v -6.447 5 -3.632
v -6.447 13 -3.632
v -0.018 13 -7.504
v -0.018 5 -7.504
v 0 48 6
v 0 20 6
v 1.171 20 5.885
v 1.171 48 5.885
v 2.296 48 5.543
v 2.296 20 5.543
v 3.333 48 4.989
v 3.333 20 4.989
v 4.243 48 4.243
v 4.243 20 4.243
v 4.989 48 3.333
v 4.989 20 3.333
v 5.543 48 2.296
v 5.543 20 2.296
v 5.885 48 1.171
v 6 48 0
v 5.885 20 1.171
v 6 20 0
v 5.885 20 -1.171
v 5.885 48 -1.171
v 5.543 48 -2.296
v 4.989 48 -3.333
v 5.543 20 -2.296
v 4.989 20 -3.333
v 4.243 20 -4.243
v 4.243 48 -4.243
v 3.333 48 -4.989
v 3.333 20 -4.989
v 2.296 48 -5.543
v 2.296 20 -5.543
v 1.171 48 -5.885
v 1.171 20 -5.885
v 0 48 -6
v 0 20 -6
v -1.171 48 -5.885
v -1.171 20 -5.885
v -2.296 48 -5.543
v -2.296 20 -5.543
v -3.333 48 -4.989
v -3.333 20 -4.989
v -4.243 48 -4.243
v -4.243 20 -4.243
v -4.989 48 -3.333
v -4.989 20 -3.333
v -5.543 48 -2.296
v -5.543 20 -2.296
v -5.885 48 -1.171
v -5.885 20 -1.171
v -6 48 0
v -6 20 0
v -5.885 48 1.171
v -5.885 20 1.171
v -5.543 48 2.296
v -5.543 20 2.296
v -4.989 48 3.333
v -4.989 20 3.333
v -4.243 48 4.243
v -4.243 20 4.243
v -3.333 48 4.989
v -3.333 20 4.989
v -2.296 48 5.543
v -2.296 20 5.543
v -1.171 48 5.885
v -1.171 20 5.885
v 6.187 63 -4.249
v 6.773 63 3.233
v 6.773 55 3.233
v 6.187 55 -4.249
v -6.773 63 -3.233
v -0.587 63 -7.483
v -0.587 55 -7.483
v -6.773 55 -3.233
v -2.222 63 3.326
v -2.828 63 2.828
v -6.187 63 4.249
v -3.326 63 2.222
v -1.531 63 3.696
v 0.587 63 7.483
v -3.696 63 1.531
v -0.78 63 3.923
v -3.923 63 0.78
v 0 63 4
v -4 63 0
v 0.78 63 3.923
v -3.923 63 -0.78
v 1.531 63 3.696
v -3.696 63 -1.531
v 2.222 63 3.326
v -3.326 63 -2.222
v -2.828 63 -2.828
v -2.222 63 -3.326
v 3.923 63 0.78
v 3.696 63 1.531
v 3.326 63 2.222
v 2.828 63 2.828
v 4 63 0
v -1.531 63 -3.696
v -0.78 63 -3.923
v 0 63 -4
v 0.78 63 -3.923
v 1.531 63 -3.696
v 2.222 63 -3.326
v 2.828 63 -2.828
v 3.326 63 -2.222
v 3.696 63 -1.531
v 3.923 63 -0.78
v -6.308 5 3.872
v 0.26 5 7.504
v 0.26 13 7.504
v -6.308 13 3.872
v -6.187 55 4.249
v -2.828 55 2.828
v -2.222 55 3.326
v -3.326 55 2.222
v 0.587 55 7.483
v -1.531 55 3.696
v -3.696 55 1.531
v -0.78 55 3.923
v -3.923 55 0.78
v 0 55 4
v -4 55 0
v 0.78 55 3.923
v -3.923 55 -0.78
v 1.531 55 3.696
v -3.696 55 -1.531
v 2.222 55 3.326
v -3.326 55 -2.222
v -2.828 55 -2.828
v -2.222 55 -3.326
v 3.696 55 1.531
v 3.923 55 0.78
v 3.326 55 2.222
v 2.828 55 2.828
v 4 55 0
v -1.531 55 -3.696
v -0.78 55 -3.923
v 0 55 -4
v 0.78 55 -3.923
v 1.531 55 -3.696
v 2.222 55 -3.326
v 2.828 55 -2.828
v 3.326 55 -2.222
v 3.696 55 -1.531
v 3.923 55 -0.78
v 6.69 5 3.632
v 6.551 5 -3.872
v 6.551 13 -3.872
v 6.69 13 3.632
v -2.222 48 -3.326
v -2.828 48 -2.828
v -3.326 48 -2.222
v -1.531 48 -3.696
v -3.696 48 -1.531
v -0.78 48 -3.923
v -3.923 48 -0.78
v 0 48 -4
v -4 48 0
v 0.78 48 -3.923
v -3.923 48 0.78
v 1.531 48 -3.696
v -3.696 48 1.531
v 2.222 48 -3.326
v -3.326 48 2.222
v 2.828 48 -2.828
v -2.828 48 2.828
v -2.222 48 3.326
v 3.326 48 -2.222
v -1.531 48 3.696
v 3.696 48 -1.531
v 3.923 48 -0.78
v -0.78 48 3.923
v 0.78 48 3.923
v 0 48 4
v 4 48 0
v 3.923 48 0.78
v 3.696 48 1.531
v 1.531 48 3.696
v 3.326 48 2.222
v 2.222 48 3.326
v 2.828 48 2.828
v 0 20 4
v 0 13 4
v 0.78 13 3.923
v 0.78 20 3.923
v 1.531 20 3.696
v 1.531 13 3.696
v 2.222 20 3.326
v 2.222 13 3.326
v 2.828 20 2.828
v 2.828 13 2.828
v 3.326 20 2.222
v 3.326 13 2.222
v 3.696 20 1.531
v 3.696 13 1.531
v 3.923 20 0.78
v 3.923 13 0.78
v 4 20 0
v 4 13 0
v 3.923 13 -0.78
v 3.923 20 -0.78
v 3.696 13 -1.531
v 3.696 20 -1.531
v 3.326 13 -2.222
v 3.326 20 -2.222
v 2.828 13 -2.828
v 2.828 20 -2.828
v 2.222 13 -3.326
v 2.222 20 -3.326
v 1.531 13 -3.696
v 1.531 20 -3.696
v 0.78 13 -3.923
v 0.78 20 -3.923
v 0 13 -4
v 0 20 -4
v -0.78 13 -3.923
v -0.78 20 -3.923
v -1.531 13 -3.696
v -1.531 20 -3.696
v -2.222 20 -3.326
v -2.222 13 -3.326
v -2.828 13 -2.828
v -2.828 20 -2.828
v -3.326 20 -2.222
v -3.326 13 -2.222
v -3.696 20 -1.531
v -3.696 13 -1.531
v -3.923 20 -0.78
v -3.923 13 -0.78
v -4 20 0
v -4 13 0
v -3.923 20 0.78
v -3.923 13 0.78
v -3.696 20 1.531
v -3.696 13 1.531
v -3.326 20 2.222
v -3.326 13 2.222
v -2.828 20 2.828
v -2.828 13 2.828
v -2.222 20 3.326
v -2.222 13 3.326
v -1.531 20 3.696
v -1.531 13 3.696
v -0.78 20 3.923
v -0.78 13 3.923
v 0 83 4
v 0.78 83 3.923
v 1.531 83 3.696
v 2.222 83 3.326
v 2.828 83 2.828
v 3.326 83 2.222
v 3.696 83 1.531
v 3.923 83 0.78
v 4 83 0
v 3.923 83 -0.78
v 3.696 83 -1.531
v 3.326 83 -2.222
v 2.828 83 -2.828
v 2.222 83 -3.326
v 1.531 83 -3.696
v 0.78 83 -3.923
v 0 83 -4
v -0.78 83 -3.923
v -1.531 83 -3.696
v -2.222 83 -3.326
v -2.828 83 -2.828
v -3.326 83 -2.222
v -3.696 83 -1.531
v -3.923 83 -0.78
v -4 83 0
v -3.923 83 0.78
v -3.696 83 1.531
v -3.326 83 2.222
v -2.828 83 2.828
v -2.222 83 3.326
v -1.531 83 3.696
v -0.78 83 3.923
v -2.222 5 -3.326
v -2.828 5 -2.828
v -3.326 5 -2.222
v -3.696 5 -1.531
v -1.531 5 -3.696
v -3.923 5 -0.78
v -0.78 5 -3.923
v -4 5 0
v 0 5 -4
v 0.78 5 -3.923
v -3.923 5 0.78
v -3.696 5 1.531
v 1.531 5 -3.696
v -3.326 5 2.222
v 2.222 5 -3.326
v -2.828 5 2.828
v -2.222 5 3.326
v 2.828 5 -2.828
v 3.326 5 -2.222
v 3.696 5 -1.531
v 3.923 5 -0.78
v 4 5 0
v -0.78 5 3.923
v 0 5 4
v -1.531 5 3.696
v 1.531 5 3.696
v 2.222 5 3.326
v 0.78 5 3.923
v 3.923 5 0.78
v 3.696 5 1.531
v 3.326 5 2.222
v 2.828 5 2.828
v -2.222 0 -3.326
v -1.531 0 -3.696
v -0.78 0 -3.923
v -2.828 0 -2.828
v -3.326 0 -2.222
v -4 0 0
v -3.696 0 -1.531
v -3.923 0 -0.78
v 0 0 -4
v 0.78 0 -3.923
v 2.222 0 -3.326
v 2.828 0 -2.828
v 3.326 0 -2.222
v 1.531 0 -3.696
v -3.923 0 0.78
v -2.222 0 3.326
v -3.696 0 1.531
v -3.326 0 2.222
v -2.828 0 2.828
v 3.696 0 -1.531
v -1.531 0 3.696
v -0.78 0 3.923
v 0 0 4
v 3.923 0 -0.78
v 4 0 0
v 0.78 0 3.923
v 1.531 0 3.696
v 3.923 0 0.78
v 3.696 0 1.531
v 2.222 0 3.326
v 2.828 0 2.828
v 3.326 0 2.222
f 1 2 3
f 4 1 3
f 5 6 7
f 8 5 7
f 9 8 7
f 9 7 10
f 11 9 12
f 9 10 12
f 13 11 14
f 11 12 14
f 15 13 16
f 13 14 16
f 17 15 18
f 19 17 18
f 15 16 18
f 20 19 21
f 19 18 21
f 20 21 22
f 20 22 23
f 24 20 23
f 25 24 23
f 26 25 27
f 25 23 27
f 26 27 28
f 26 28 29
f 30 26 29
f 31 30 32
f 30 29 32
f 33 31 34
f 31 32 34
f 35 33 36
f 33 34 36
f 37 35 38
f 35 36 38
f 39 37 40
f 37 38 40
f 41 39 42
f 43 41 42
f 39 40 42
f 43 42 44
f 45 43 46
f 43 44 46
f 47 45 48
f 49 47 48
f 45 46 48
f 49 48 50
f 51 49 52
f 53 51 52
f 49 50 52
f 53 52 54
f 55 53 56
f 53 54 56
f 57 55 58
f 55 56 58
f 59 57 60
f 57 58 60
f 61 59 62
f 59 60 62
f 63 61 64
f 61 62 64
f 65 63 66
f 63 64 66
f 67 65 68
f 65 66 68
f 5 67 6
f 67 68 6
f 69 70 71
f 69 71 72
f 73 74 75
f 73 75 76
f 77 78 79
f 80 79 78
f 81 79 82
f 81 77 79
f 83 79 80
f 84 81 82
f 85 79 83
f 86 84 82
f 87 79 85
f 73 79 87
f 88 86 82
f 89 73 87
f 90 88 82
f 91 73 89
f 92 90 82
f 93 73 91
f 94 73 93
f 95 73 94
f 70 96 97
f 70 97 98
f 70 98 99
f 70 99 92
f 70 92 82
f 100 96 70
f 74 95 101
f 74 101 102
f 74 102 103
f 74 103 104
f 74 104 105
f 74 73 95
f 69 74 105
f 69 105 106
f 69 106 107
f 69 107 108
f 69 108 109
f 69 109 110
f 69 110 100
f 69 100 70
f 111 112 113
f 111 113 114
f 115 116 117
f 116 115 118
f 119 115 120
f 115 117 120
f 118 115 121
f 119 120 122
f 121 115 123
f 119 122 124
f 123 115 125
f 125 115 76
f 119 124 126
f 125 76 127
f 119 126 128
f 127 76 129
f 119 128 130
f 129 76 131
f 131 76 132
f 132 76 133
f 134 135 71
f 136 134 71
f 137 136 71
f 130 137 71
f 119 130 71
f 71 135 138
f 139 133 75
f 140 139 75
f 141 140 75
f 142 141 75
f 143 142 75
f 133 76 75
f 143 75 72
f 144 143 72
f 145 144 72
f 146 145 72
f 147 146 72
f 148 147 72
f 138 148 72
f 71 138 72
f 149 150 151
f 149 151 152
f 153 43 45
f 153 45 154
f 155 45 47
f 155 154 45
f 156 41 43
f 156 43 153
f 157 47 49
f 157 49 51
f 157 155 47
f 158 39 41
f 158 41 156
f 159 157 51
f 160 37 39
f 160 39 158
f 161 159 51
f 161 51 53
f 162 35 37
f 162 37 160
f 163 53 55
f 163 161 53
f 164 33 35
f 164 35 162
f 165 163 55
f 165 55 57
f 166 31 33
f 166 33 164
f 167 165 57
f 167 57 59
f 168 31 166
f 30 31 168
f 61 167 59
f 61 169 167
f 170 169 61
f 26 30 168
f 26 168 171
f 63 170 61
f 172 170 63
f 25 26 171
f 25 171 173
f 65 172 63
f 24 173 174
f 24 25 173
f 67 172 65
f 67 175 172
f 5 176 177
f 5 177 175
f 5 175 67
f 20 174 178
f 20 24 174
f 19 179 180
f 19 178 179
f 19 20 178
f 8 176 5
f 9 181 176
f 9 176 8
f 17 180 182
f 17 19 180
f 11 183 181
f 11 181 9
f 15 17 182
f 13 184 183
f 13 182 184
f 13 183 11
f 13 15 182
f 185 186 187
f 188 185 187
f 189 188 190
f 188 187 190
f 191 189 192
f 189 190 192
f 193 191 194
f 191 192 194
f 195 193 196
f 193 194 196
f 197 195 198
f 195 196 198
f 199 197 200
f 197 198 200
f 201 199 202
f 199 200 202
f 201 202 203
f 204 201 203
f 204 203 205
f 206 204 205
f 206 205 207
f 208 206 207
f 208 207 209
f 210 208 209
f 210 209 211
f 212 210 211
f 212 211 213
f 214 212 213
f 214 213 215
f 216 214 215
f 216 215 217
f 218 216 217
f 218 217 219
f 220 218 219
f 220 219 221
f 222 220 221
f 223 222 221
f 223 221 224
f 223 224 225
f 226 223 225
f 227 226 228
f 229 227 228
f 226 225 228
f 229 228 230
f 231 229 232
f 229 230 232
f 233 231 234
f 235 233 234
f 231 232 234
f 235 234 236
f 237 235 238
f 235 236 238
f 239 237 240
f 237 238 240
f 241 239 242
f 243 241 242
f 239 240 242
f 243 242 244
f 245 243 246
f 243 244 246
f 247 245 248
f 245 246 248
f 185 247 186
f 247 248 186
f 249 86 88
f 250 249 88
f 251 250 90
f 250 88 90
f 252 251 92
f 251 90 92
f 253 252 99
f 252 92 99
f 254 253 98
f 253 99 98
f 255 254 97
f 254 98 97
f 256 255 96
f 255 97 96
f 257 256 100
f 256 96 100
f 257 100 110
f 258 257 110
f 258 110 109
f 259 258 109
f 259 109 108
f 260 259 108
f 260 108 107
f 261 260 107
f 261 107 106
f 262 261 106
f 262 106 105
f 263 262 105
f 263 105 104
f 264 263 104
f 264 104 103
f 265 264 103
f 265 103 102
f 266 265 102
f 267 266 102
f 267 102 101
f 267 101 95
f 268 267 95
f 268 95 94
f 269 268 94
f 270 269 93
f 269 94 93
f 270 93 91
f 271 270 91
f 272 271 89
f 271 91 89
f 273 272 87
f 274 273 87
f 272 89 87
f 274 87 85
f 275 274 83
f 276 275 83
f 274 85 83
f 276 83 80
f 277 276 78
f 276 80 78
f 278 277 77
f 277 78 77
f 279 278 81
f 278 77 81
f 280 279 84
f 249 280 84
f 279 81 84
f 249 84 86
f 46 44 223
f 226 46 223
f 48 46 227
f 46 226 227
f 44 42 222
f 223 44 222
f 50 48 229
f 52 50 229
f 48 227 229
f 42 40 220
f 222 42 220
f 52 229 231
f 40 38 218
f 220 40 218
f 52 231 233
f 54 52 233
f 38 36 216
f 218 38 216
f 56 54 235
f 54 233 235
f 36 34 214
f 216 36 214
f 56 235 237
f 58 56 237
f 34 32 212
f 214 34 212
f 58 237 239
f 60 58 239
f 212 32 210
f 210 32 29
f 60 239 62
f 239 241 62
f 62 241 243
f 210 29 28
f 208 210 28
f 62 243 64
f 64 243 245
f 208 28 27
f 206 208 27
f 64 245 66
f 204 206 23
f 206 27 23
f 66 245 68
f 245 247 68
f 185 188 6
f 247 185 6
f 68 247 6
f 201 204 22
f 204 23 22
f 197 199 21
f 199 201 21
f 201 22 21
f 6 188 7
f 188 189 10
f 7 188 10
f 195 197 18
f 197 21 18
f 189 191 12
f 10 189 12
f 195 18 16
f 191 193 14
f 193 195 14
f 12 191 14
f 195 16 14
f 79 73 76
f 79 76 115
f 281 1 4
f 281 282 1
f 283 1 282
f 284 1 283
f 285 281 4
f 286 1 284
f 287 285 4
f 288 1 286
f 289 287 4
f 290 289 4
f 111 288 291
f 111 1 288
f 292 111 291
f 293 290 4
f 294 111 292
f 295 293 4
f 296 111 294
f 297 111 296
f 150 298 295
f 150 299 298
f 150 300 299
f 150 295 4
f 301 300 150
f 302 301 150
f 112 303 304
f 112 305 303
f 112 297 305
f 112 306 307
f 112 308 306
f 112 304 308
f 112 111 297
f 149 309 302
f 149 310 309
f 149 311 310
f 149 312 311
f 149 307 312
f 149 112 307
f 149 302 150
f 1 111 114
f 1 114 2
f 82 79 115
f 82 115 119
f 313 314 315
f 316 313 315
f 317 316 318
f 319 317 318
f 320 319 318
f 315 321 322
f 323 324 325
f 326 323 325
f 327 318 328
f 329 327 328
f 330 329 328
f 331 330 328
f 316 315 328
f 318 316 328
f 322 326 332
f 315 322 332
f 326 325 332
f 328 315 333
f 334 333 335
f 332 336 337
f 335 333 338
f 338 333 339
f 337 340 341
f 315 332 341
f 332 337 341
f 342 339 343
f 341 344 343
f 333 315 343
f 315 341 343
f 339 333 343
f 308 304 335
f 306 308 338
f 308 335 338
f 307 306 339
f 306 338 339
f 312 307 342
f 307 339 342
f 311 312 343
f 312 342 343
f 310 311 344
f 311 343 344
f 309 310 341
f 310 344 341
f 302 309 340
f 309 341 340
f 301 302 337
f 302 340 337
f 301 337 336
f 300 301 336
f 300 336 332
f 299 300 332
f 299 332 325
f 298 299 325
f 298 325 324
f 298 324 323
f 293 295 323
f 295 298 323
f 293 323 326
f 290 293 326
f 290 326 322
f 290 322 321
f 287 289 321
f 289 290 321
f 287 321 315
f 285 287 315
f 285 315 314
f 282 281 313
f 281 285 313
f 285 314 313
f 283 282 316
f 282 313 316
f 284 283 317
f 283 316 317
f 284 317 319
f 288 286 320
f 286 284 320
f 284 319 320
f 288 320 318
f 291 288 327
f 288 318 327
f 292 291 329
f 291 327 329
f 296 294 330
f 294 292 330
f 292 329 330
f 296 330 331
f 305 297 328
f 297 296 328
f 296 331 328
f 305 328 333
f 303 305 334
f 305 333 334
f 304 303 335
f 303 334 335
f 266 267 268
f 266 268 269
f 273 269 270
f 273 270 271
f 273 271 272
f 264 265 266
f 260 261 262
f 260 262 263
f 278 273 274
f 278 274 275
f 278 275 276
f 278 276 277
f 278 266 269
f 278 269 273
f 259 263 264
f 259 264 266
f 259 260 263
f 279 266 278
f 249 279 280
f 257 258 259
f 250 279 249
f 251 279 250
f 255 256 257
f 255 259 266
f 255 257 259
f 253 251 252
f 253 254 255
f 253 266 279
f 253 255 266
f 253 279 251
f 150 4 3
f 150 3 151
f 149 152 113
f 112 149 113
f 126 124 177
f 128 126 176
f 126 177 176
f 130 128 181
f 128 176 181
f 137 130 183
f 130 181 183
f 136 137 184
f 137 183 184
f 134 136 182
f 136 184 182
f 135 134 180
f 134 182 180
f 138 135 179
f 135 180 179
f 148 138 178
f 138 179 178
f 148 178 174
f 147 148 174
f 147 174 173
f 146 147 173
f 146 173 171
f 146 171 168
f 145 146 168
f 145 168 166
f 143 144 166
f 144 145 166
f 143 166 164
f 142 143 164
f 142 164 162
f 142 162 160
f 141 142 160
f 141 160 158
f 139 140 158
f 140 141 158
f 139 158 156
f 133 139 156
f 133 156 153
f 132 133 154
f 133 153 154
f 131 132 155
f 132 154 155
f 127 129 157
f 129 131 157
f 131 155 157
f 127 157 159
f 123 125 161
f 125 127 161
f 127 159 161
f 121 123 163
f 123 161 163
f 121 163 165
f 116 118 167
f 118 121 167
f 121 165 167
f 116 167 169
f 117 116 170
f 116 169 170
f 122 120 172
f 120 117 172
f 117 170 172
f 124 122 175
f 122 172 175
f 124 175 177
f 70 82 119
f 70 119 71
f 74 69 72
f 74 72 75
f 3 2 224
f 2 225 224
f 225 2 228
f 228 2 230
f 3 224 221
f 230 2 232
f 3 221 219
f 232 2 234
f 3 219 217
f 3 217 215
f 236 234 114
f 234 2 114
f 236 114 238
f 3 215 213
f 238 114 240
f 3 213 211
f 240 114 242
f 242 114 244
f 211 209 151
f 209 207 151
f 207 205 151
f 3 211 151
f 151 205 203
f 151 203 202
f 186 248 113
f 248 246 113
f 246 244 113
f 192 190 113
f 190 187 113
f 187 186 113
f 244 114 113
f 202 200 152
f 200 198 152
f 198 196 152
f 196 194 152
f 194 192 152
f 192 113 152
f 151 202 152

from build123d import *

# Parameters (mm, degrees)
IZIM1_R                     = 4
Y_KSEKLIK_EKSTR_ZYON1_DEPTH = 20
IZIM2_R                     = 6
Y_KSEKLIK_EKSTR_ZYON2_DEPTH = 28
IZIM3_R                     = 4
Y_KSEKLIK_EKSTR_ZYON3_DEPTH = 35
Y_KSEKLIK_EKSTR_ZYON4_START = -5
Y_KSEKLIK_EKSTR_ZYON4_DEPTH = 8
Y_KSEKLIK_EKSTR_ZYON5_START = -20
Y_KSEKLIK_EKSTR_ZYON5_DEPTH = 8


with BuildPart() as part:
    # Çizim1 → Yükseklik-Ekstrüzyon1 (new body)
    with BuildSketch(Plane(origin=(0, 0, 0), x_dir=(1, 0, 0), z_dir=(0, 1, 0))):
        with Locations(Location((0, 0, 0), (0, 0, 270))):
            Circle(IZIM1_R)
    extrude(amount=Y_KSEKLIK_EKSTR_ZYON1_DEPTH)

    # Çizim2 → Yükseklik-Ekstrüzyon2 (add)
    with BuildSketch(Plane(origin=(0, 20, 0), x_dir=(1, 0, 0), z_dir=(0, 1, 0))):
        with Locations(Location((0, 0, 0), (0, 0, 270))):
            Circle(IZIM2_R)
    extrude(amount=Y_KSEKLIK_EKSTR_ZYON2_DEPTH)

    # Çizim3 → Yükseklik-Ekstrüzyon3 (add)
    with BuildSketch(Plane(origin=(0, 48, 0), x_dir=(1, 0, 0), z_dir=(0, 1, 0))):
        with Locations(Location((0, 0, 0), (0, 0, 270))):
            Circle(IZIM3_R)
    extrude(amount=Y_KSEKLIK_EKSTR_ZYON3_DEPTH)

    # Çizim4 → Yükseklik-Ekstrüzyon4 (add)
    with BuildSketch(Plane.XZ.offset(Y_KSEKLIK_EKSTR_ZYON4_START)):
        Polygon((-6.308264839, 3.872314527), (-6.447035908, -3.631955985), (-0.017532542, -7.504270512), (6.550741893, -3.872314527), (6.689512962, 3.631955985), (0.260009596, 7.504270512), align=None)
    extrude(amount=-Y_KSEKLIK_EKSTR_ZYON4_DEPTH)

    # Çizim5 → Yükseklik-Ekstrüzyon5 (add)
    with BuildSketch(Plane(origin=(0, 83, 0), x_dir=(1, 0, 0), z_dir=(0, 1, 0)).offset(Y_KSEKLIK_EKSTR_ZYON5_START)):
        Polygon((6.773389455, -3.23334635), (6.186854806, 4.249254163), (-0.586534649, 7.482600513), (-6.773389455, 3.23334635), (-6.186854806, -4.249254163), (0.586534649, -7.482600513), align=None)
    extrude(amount=-Y_KSEKLIK_EKSTR_ZYON5_DEPTH)


solid = part.part
